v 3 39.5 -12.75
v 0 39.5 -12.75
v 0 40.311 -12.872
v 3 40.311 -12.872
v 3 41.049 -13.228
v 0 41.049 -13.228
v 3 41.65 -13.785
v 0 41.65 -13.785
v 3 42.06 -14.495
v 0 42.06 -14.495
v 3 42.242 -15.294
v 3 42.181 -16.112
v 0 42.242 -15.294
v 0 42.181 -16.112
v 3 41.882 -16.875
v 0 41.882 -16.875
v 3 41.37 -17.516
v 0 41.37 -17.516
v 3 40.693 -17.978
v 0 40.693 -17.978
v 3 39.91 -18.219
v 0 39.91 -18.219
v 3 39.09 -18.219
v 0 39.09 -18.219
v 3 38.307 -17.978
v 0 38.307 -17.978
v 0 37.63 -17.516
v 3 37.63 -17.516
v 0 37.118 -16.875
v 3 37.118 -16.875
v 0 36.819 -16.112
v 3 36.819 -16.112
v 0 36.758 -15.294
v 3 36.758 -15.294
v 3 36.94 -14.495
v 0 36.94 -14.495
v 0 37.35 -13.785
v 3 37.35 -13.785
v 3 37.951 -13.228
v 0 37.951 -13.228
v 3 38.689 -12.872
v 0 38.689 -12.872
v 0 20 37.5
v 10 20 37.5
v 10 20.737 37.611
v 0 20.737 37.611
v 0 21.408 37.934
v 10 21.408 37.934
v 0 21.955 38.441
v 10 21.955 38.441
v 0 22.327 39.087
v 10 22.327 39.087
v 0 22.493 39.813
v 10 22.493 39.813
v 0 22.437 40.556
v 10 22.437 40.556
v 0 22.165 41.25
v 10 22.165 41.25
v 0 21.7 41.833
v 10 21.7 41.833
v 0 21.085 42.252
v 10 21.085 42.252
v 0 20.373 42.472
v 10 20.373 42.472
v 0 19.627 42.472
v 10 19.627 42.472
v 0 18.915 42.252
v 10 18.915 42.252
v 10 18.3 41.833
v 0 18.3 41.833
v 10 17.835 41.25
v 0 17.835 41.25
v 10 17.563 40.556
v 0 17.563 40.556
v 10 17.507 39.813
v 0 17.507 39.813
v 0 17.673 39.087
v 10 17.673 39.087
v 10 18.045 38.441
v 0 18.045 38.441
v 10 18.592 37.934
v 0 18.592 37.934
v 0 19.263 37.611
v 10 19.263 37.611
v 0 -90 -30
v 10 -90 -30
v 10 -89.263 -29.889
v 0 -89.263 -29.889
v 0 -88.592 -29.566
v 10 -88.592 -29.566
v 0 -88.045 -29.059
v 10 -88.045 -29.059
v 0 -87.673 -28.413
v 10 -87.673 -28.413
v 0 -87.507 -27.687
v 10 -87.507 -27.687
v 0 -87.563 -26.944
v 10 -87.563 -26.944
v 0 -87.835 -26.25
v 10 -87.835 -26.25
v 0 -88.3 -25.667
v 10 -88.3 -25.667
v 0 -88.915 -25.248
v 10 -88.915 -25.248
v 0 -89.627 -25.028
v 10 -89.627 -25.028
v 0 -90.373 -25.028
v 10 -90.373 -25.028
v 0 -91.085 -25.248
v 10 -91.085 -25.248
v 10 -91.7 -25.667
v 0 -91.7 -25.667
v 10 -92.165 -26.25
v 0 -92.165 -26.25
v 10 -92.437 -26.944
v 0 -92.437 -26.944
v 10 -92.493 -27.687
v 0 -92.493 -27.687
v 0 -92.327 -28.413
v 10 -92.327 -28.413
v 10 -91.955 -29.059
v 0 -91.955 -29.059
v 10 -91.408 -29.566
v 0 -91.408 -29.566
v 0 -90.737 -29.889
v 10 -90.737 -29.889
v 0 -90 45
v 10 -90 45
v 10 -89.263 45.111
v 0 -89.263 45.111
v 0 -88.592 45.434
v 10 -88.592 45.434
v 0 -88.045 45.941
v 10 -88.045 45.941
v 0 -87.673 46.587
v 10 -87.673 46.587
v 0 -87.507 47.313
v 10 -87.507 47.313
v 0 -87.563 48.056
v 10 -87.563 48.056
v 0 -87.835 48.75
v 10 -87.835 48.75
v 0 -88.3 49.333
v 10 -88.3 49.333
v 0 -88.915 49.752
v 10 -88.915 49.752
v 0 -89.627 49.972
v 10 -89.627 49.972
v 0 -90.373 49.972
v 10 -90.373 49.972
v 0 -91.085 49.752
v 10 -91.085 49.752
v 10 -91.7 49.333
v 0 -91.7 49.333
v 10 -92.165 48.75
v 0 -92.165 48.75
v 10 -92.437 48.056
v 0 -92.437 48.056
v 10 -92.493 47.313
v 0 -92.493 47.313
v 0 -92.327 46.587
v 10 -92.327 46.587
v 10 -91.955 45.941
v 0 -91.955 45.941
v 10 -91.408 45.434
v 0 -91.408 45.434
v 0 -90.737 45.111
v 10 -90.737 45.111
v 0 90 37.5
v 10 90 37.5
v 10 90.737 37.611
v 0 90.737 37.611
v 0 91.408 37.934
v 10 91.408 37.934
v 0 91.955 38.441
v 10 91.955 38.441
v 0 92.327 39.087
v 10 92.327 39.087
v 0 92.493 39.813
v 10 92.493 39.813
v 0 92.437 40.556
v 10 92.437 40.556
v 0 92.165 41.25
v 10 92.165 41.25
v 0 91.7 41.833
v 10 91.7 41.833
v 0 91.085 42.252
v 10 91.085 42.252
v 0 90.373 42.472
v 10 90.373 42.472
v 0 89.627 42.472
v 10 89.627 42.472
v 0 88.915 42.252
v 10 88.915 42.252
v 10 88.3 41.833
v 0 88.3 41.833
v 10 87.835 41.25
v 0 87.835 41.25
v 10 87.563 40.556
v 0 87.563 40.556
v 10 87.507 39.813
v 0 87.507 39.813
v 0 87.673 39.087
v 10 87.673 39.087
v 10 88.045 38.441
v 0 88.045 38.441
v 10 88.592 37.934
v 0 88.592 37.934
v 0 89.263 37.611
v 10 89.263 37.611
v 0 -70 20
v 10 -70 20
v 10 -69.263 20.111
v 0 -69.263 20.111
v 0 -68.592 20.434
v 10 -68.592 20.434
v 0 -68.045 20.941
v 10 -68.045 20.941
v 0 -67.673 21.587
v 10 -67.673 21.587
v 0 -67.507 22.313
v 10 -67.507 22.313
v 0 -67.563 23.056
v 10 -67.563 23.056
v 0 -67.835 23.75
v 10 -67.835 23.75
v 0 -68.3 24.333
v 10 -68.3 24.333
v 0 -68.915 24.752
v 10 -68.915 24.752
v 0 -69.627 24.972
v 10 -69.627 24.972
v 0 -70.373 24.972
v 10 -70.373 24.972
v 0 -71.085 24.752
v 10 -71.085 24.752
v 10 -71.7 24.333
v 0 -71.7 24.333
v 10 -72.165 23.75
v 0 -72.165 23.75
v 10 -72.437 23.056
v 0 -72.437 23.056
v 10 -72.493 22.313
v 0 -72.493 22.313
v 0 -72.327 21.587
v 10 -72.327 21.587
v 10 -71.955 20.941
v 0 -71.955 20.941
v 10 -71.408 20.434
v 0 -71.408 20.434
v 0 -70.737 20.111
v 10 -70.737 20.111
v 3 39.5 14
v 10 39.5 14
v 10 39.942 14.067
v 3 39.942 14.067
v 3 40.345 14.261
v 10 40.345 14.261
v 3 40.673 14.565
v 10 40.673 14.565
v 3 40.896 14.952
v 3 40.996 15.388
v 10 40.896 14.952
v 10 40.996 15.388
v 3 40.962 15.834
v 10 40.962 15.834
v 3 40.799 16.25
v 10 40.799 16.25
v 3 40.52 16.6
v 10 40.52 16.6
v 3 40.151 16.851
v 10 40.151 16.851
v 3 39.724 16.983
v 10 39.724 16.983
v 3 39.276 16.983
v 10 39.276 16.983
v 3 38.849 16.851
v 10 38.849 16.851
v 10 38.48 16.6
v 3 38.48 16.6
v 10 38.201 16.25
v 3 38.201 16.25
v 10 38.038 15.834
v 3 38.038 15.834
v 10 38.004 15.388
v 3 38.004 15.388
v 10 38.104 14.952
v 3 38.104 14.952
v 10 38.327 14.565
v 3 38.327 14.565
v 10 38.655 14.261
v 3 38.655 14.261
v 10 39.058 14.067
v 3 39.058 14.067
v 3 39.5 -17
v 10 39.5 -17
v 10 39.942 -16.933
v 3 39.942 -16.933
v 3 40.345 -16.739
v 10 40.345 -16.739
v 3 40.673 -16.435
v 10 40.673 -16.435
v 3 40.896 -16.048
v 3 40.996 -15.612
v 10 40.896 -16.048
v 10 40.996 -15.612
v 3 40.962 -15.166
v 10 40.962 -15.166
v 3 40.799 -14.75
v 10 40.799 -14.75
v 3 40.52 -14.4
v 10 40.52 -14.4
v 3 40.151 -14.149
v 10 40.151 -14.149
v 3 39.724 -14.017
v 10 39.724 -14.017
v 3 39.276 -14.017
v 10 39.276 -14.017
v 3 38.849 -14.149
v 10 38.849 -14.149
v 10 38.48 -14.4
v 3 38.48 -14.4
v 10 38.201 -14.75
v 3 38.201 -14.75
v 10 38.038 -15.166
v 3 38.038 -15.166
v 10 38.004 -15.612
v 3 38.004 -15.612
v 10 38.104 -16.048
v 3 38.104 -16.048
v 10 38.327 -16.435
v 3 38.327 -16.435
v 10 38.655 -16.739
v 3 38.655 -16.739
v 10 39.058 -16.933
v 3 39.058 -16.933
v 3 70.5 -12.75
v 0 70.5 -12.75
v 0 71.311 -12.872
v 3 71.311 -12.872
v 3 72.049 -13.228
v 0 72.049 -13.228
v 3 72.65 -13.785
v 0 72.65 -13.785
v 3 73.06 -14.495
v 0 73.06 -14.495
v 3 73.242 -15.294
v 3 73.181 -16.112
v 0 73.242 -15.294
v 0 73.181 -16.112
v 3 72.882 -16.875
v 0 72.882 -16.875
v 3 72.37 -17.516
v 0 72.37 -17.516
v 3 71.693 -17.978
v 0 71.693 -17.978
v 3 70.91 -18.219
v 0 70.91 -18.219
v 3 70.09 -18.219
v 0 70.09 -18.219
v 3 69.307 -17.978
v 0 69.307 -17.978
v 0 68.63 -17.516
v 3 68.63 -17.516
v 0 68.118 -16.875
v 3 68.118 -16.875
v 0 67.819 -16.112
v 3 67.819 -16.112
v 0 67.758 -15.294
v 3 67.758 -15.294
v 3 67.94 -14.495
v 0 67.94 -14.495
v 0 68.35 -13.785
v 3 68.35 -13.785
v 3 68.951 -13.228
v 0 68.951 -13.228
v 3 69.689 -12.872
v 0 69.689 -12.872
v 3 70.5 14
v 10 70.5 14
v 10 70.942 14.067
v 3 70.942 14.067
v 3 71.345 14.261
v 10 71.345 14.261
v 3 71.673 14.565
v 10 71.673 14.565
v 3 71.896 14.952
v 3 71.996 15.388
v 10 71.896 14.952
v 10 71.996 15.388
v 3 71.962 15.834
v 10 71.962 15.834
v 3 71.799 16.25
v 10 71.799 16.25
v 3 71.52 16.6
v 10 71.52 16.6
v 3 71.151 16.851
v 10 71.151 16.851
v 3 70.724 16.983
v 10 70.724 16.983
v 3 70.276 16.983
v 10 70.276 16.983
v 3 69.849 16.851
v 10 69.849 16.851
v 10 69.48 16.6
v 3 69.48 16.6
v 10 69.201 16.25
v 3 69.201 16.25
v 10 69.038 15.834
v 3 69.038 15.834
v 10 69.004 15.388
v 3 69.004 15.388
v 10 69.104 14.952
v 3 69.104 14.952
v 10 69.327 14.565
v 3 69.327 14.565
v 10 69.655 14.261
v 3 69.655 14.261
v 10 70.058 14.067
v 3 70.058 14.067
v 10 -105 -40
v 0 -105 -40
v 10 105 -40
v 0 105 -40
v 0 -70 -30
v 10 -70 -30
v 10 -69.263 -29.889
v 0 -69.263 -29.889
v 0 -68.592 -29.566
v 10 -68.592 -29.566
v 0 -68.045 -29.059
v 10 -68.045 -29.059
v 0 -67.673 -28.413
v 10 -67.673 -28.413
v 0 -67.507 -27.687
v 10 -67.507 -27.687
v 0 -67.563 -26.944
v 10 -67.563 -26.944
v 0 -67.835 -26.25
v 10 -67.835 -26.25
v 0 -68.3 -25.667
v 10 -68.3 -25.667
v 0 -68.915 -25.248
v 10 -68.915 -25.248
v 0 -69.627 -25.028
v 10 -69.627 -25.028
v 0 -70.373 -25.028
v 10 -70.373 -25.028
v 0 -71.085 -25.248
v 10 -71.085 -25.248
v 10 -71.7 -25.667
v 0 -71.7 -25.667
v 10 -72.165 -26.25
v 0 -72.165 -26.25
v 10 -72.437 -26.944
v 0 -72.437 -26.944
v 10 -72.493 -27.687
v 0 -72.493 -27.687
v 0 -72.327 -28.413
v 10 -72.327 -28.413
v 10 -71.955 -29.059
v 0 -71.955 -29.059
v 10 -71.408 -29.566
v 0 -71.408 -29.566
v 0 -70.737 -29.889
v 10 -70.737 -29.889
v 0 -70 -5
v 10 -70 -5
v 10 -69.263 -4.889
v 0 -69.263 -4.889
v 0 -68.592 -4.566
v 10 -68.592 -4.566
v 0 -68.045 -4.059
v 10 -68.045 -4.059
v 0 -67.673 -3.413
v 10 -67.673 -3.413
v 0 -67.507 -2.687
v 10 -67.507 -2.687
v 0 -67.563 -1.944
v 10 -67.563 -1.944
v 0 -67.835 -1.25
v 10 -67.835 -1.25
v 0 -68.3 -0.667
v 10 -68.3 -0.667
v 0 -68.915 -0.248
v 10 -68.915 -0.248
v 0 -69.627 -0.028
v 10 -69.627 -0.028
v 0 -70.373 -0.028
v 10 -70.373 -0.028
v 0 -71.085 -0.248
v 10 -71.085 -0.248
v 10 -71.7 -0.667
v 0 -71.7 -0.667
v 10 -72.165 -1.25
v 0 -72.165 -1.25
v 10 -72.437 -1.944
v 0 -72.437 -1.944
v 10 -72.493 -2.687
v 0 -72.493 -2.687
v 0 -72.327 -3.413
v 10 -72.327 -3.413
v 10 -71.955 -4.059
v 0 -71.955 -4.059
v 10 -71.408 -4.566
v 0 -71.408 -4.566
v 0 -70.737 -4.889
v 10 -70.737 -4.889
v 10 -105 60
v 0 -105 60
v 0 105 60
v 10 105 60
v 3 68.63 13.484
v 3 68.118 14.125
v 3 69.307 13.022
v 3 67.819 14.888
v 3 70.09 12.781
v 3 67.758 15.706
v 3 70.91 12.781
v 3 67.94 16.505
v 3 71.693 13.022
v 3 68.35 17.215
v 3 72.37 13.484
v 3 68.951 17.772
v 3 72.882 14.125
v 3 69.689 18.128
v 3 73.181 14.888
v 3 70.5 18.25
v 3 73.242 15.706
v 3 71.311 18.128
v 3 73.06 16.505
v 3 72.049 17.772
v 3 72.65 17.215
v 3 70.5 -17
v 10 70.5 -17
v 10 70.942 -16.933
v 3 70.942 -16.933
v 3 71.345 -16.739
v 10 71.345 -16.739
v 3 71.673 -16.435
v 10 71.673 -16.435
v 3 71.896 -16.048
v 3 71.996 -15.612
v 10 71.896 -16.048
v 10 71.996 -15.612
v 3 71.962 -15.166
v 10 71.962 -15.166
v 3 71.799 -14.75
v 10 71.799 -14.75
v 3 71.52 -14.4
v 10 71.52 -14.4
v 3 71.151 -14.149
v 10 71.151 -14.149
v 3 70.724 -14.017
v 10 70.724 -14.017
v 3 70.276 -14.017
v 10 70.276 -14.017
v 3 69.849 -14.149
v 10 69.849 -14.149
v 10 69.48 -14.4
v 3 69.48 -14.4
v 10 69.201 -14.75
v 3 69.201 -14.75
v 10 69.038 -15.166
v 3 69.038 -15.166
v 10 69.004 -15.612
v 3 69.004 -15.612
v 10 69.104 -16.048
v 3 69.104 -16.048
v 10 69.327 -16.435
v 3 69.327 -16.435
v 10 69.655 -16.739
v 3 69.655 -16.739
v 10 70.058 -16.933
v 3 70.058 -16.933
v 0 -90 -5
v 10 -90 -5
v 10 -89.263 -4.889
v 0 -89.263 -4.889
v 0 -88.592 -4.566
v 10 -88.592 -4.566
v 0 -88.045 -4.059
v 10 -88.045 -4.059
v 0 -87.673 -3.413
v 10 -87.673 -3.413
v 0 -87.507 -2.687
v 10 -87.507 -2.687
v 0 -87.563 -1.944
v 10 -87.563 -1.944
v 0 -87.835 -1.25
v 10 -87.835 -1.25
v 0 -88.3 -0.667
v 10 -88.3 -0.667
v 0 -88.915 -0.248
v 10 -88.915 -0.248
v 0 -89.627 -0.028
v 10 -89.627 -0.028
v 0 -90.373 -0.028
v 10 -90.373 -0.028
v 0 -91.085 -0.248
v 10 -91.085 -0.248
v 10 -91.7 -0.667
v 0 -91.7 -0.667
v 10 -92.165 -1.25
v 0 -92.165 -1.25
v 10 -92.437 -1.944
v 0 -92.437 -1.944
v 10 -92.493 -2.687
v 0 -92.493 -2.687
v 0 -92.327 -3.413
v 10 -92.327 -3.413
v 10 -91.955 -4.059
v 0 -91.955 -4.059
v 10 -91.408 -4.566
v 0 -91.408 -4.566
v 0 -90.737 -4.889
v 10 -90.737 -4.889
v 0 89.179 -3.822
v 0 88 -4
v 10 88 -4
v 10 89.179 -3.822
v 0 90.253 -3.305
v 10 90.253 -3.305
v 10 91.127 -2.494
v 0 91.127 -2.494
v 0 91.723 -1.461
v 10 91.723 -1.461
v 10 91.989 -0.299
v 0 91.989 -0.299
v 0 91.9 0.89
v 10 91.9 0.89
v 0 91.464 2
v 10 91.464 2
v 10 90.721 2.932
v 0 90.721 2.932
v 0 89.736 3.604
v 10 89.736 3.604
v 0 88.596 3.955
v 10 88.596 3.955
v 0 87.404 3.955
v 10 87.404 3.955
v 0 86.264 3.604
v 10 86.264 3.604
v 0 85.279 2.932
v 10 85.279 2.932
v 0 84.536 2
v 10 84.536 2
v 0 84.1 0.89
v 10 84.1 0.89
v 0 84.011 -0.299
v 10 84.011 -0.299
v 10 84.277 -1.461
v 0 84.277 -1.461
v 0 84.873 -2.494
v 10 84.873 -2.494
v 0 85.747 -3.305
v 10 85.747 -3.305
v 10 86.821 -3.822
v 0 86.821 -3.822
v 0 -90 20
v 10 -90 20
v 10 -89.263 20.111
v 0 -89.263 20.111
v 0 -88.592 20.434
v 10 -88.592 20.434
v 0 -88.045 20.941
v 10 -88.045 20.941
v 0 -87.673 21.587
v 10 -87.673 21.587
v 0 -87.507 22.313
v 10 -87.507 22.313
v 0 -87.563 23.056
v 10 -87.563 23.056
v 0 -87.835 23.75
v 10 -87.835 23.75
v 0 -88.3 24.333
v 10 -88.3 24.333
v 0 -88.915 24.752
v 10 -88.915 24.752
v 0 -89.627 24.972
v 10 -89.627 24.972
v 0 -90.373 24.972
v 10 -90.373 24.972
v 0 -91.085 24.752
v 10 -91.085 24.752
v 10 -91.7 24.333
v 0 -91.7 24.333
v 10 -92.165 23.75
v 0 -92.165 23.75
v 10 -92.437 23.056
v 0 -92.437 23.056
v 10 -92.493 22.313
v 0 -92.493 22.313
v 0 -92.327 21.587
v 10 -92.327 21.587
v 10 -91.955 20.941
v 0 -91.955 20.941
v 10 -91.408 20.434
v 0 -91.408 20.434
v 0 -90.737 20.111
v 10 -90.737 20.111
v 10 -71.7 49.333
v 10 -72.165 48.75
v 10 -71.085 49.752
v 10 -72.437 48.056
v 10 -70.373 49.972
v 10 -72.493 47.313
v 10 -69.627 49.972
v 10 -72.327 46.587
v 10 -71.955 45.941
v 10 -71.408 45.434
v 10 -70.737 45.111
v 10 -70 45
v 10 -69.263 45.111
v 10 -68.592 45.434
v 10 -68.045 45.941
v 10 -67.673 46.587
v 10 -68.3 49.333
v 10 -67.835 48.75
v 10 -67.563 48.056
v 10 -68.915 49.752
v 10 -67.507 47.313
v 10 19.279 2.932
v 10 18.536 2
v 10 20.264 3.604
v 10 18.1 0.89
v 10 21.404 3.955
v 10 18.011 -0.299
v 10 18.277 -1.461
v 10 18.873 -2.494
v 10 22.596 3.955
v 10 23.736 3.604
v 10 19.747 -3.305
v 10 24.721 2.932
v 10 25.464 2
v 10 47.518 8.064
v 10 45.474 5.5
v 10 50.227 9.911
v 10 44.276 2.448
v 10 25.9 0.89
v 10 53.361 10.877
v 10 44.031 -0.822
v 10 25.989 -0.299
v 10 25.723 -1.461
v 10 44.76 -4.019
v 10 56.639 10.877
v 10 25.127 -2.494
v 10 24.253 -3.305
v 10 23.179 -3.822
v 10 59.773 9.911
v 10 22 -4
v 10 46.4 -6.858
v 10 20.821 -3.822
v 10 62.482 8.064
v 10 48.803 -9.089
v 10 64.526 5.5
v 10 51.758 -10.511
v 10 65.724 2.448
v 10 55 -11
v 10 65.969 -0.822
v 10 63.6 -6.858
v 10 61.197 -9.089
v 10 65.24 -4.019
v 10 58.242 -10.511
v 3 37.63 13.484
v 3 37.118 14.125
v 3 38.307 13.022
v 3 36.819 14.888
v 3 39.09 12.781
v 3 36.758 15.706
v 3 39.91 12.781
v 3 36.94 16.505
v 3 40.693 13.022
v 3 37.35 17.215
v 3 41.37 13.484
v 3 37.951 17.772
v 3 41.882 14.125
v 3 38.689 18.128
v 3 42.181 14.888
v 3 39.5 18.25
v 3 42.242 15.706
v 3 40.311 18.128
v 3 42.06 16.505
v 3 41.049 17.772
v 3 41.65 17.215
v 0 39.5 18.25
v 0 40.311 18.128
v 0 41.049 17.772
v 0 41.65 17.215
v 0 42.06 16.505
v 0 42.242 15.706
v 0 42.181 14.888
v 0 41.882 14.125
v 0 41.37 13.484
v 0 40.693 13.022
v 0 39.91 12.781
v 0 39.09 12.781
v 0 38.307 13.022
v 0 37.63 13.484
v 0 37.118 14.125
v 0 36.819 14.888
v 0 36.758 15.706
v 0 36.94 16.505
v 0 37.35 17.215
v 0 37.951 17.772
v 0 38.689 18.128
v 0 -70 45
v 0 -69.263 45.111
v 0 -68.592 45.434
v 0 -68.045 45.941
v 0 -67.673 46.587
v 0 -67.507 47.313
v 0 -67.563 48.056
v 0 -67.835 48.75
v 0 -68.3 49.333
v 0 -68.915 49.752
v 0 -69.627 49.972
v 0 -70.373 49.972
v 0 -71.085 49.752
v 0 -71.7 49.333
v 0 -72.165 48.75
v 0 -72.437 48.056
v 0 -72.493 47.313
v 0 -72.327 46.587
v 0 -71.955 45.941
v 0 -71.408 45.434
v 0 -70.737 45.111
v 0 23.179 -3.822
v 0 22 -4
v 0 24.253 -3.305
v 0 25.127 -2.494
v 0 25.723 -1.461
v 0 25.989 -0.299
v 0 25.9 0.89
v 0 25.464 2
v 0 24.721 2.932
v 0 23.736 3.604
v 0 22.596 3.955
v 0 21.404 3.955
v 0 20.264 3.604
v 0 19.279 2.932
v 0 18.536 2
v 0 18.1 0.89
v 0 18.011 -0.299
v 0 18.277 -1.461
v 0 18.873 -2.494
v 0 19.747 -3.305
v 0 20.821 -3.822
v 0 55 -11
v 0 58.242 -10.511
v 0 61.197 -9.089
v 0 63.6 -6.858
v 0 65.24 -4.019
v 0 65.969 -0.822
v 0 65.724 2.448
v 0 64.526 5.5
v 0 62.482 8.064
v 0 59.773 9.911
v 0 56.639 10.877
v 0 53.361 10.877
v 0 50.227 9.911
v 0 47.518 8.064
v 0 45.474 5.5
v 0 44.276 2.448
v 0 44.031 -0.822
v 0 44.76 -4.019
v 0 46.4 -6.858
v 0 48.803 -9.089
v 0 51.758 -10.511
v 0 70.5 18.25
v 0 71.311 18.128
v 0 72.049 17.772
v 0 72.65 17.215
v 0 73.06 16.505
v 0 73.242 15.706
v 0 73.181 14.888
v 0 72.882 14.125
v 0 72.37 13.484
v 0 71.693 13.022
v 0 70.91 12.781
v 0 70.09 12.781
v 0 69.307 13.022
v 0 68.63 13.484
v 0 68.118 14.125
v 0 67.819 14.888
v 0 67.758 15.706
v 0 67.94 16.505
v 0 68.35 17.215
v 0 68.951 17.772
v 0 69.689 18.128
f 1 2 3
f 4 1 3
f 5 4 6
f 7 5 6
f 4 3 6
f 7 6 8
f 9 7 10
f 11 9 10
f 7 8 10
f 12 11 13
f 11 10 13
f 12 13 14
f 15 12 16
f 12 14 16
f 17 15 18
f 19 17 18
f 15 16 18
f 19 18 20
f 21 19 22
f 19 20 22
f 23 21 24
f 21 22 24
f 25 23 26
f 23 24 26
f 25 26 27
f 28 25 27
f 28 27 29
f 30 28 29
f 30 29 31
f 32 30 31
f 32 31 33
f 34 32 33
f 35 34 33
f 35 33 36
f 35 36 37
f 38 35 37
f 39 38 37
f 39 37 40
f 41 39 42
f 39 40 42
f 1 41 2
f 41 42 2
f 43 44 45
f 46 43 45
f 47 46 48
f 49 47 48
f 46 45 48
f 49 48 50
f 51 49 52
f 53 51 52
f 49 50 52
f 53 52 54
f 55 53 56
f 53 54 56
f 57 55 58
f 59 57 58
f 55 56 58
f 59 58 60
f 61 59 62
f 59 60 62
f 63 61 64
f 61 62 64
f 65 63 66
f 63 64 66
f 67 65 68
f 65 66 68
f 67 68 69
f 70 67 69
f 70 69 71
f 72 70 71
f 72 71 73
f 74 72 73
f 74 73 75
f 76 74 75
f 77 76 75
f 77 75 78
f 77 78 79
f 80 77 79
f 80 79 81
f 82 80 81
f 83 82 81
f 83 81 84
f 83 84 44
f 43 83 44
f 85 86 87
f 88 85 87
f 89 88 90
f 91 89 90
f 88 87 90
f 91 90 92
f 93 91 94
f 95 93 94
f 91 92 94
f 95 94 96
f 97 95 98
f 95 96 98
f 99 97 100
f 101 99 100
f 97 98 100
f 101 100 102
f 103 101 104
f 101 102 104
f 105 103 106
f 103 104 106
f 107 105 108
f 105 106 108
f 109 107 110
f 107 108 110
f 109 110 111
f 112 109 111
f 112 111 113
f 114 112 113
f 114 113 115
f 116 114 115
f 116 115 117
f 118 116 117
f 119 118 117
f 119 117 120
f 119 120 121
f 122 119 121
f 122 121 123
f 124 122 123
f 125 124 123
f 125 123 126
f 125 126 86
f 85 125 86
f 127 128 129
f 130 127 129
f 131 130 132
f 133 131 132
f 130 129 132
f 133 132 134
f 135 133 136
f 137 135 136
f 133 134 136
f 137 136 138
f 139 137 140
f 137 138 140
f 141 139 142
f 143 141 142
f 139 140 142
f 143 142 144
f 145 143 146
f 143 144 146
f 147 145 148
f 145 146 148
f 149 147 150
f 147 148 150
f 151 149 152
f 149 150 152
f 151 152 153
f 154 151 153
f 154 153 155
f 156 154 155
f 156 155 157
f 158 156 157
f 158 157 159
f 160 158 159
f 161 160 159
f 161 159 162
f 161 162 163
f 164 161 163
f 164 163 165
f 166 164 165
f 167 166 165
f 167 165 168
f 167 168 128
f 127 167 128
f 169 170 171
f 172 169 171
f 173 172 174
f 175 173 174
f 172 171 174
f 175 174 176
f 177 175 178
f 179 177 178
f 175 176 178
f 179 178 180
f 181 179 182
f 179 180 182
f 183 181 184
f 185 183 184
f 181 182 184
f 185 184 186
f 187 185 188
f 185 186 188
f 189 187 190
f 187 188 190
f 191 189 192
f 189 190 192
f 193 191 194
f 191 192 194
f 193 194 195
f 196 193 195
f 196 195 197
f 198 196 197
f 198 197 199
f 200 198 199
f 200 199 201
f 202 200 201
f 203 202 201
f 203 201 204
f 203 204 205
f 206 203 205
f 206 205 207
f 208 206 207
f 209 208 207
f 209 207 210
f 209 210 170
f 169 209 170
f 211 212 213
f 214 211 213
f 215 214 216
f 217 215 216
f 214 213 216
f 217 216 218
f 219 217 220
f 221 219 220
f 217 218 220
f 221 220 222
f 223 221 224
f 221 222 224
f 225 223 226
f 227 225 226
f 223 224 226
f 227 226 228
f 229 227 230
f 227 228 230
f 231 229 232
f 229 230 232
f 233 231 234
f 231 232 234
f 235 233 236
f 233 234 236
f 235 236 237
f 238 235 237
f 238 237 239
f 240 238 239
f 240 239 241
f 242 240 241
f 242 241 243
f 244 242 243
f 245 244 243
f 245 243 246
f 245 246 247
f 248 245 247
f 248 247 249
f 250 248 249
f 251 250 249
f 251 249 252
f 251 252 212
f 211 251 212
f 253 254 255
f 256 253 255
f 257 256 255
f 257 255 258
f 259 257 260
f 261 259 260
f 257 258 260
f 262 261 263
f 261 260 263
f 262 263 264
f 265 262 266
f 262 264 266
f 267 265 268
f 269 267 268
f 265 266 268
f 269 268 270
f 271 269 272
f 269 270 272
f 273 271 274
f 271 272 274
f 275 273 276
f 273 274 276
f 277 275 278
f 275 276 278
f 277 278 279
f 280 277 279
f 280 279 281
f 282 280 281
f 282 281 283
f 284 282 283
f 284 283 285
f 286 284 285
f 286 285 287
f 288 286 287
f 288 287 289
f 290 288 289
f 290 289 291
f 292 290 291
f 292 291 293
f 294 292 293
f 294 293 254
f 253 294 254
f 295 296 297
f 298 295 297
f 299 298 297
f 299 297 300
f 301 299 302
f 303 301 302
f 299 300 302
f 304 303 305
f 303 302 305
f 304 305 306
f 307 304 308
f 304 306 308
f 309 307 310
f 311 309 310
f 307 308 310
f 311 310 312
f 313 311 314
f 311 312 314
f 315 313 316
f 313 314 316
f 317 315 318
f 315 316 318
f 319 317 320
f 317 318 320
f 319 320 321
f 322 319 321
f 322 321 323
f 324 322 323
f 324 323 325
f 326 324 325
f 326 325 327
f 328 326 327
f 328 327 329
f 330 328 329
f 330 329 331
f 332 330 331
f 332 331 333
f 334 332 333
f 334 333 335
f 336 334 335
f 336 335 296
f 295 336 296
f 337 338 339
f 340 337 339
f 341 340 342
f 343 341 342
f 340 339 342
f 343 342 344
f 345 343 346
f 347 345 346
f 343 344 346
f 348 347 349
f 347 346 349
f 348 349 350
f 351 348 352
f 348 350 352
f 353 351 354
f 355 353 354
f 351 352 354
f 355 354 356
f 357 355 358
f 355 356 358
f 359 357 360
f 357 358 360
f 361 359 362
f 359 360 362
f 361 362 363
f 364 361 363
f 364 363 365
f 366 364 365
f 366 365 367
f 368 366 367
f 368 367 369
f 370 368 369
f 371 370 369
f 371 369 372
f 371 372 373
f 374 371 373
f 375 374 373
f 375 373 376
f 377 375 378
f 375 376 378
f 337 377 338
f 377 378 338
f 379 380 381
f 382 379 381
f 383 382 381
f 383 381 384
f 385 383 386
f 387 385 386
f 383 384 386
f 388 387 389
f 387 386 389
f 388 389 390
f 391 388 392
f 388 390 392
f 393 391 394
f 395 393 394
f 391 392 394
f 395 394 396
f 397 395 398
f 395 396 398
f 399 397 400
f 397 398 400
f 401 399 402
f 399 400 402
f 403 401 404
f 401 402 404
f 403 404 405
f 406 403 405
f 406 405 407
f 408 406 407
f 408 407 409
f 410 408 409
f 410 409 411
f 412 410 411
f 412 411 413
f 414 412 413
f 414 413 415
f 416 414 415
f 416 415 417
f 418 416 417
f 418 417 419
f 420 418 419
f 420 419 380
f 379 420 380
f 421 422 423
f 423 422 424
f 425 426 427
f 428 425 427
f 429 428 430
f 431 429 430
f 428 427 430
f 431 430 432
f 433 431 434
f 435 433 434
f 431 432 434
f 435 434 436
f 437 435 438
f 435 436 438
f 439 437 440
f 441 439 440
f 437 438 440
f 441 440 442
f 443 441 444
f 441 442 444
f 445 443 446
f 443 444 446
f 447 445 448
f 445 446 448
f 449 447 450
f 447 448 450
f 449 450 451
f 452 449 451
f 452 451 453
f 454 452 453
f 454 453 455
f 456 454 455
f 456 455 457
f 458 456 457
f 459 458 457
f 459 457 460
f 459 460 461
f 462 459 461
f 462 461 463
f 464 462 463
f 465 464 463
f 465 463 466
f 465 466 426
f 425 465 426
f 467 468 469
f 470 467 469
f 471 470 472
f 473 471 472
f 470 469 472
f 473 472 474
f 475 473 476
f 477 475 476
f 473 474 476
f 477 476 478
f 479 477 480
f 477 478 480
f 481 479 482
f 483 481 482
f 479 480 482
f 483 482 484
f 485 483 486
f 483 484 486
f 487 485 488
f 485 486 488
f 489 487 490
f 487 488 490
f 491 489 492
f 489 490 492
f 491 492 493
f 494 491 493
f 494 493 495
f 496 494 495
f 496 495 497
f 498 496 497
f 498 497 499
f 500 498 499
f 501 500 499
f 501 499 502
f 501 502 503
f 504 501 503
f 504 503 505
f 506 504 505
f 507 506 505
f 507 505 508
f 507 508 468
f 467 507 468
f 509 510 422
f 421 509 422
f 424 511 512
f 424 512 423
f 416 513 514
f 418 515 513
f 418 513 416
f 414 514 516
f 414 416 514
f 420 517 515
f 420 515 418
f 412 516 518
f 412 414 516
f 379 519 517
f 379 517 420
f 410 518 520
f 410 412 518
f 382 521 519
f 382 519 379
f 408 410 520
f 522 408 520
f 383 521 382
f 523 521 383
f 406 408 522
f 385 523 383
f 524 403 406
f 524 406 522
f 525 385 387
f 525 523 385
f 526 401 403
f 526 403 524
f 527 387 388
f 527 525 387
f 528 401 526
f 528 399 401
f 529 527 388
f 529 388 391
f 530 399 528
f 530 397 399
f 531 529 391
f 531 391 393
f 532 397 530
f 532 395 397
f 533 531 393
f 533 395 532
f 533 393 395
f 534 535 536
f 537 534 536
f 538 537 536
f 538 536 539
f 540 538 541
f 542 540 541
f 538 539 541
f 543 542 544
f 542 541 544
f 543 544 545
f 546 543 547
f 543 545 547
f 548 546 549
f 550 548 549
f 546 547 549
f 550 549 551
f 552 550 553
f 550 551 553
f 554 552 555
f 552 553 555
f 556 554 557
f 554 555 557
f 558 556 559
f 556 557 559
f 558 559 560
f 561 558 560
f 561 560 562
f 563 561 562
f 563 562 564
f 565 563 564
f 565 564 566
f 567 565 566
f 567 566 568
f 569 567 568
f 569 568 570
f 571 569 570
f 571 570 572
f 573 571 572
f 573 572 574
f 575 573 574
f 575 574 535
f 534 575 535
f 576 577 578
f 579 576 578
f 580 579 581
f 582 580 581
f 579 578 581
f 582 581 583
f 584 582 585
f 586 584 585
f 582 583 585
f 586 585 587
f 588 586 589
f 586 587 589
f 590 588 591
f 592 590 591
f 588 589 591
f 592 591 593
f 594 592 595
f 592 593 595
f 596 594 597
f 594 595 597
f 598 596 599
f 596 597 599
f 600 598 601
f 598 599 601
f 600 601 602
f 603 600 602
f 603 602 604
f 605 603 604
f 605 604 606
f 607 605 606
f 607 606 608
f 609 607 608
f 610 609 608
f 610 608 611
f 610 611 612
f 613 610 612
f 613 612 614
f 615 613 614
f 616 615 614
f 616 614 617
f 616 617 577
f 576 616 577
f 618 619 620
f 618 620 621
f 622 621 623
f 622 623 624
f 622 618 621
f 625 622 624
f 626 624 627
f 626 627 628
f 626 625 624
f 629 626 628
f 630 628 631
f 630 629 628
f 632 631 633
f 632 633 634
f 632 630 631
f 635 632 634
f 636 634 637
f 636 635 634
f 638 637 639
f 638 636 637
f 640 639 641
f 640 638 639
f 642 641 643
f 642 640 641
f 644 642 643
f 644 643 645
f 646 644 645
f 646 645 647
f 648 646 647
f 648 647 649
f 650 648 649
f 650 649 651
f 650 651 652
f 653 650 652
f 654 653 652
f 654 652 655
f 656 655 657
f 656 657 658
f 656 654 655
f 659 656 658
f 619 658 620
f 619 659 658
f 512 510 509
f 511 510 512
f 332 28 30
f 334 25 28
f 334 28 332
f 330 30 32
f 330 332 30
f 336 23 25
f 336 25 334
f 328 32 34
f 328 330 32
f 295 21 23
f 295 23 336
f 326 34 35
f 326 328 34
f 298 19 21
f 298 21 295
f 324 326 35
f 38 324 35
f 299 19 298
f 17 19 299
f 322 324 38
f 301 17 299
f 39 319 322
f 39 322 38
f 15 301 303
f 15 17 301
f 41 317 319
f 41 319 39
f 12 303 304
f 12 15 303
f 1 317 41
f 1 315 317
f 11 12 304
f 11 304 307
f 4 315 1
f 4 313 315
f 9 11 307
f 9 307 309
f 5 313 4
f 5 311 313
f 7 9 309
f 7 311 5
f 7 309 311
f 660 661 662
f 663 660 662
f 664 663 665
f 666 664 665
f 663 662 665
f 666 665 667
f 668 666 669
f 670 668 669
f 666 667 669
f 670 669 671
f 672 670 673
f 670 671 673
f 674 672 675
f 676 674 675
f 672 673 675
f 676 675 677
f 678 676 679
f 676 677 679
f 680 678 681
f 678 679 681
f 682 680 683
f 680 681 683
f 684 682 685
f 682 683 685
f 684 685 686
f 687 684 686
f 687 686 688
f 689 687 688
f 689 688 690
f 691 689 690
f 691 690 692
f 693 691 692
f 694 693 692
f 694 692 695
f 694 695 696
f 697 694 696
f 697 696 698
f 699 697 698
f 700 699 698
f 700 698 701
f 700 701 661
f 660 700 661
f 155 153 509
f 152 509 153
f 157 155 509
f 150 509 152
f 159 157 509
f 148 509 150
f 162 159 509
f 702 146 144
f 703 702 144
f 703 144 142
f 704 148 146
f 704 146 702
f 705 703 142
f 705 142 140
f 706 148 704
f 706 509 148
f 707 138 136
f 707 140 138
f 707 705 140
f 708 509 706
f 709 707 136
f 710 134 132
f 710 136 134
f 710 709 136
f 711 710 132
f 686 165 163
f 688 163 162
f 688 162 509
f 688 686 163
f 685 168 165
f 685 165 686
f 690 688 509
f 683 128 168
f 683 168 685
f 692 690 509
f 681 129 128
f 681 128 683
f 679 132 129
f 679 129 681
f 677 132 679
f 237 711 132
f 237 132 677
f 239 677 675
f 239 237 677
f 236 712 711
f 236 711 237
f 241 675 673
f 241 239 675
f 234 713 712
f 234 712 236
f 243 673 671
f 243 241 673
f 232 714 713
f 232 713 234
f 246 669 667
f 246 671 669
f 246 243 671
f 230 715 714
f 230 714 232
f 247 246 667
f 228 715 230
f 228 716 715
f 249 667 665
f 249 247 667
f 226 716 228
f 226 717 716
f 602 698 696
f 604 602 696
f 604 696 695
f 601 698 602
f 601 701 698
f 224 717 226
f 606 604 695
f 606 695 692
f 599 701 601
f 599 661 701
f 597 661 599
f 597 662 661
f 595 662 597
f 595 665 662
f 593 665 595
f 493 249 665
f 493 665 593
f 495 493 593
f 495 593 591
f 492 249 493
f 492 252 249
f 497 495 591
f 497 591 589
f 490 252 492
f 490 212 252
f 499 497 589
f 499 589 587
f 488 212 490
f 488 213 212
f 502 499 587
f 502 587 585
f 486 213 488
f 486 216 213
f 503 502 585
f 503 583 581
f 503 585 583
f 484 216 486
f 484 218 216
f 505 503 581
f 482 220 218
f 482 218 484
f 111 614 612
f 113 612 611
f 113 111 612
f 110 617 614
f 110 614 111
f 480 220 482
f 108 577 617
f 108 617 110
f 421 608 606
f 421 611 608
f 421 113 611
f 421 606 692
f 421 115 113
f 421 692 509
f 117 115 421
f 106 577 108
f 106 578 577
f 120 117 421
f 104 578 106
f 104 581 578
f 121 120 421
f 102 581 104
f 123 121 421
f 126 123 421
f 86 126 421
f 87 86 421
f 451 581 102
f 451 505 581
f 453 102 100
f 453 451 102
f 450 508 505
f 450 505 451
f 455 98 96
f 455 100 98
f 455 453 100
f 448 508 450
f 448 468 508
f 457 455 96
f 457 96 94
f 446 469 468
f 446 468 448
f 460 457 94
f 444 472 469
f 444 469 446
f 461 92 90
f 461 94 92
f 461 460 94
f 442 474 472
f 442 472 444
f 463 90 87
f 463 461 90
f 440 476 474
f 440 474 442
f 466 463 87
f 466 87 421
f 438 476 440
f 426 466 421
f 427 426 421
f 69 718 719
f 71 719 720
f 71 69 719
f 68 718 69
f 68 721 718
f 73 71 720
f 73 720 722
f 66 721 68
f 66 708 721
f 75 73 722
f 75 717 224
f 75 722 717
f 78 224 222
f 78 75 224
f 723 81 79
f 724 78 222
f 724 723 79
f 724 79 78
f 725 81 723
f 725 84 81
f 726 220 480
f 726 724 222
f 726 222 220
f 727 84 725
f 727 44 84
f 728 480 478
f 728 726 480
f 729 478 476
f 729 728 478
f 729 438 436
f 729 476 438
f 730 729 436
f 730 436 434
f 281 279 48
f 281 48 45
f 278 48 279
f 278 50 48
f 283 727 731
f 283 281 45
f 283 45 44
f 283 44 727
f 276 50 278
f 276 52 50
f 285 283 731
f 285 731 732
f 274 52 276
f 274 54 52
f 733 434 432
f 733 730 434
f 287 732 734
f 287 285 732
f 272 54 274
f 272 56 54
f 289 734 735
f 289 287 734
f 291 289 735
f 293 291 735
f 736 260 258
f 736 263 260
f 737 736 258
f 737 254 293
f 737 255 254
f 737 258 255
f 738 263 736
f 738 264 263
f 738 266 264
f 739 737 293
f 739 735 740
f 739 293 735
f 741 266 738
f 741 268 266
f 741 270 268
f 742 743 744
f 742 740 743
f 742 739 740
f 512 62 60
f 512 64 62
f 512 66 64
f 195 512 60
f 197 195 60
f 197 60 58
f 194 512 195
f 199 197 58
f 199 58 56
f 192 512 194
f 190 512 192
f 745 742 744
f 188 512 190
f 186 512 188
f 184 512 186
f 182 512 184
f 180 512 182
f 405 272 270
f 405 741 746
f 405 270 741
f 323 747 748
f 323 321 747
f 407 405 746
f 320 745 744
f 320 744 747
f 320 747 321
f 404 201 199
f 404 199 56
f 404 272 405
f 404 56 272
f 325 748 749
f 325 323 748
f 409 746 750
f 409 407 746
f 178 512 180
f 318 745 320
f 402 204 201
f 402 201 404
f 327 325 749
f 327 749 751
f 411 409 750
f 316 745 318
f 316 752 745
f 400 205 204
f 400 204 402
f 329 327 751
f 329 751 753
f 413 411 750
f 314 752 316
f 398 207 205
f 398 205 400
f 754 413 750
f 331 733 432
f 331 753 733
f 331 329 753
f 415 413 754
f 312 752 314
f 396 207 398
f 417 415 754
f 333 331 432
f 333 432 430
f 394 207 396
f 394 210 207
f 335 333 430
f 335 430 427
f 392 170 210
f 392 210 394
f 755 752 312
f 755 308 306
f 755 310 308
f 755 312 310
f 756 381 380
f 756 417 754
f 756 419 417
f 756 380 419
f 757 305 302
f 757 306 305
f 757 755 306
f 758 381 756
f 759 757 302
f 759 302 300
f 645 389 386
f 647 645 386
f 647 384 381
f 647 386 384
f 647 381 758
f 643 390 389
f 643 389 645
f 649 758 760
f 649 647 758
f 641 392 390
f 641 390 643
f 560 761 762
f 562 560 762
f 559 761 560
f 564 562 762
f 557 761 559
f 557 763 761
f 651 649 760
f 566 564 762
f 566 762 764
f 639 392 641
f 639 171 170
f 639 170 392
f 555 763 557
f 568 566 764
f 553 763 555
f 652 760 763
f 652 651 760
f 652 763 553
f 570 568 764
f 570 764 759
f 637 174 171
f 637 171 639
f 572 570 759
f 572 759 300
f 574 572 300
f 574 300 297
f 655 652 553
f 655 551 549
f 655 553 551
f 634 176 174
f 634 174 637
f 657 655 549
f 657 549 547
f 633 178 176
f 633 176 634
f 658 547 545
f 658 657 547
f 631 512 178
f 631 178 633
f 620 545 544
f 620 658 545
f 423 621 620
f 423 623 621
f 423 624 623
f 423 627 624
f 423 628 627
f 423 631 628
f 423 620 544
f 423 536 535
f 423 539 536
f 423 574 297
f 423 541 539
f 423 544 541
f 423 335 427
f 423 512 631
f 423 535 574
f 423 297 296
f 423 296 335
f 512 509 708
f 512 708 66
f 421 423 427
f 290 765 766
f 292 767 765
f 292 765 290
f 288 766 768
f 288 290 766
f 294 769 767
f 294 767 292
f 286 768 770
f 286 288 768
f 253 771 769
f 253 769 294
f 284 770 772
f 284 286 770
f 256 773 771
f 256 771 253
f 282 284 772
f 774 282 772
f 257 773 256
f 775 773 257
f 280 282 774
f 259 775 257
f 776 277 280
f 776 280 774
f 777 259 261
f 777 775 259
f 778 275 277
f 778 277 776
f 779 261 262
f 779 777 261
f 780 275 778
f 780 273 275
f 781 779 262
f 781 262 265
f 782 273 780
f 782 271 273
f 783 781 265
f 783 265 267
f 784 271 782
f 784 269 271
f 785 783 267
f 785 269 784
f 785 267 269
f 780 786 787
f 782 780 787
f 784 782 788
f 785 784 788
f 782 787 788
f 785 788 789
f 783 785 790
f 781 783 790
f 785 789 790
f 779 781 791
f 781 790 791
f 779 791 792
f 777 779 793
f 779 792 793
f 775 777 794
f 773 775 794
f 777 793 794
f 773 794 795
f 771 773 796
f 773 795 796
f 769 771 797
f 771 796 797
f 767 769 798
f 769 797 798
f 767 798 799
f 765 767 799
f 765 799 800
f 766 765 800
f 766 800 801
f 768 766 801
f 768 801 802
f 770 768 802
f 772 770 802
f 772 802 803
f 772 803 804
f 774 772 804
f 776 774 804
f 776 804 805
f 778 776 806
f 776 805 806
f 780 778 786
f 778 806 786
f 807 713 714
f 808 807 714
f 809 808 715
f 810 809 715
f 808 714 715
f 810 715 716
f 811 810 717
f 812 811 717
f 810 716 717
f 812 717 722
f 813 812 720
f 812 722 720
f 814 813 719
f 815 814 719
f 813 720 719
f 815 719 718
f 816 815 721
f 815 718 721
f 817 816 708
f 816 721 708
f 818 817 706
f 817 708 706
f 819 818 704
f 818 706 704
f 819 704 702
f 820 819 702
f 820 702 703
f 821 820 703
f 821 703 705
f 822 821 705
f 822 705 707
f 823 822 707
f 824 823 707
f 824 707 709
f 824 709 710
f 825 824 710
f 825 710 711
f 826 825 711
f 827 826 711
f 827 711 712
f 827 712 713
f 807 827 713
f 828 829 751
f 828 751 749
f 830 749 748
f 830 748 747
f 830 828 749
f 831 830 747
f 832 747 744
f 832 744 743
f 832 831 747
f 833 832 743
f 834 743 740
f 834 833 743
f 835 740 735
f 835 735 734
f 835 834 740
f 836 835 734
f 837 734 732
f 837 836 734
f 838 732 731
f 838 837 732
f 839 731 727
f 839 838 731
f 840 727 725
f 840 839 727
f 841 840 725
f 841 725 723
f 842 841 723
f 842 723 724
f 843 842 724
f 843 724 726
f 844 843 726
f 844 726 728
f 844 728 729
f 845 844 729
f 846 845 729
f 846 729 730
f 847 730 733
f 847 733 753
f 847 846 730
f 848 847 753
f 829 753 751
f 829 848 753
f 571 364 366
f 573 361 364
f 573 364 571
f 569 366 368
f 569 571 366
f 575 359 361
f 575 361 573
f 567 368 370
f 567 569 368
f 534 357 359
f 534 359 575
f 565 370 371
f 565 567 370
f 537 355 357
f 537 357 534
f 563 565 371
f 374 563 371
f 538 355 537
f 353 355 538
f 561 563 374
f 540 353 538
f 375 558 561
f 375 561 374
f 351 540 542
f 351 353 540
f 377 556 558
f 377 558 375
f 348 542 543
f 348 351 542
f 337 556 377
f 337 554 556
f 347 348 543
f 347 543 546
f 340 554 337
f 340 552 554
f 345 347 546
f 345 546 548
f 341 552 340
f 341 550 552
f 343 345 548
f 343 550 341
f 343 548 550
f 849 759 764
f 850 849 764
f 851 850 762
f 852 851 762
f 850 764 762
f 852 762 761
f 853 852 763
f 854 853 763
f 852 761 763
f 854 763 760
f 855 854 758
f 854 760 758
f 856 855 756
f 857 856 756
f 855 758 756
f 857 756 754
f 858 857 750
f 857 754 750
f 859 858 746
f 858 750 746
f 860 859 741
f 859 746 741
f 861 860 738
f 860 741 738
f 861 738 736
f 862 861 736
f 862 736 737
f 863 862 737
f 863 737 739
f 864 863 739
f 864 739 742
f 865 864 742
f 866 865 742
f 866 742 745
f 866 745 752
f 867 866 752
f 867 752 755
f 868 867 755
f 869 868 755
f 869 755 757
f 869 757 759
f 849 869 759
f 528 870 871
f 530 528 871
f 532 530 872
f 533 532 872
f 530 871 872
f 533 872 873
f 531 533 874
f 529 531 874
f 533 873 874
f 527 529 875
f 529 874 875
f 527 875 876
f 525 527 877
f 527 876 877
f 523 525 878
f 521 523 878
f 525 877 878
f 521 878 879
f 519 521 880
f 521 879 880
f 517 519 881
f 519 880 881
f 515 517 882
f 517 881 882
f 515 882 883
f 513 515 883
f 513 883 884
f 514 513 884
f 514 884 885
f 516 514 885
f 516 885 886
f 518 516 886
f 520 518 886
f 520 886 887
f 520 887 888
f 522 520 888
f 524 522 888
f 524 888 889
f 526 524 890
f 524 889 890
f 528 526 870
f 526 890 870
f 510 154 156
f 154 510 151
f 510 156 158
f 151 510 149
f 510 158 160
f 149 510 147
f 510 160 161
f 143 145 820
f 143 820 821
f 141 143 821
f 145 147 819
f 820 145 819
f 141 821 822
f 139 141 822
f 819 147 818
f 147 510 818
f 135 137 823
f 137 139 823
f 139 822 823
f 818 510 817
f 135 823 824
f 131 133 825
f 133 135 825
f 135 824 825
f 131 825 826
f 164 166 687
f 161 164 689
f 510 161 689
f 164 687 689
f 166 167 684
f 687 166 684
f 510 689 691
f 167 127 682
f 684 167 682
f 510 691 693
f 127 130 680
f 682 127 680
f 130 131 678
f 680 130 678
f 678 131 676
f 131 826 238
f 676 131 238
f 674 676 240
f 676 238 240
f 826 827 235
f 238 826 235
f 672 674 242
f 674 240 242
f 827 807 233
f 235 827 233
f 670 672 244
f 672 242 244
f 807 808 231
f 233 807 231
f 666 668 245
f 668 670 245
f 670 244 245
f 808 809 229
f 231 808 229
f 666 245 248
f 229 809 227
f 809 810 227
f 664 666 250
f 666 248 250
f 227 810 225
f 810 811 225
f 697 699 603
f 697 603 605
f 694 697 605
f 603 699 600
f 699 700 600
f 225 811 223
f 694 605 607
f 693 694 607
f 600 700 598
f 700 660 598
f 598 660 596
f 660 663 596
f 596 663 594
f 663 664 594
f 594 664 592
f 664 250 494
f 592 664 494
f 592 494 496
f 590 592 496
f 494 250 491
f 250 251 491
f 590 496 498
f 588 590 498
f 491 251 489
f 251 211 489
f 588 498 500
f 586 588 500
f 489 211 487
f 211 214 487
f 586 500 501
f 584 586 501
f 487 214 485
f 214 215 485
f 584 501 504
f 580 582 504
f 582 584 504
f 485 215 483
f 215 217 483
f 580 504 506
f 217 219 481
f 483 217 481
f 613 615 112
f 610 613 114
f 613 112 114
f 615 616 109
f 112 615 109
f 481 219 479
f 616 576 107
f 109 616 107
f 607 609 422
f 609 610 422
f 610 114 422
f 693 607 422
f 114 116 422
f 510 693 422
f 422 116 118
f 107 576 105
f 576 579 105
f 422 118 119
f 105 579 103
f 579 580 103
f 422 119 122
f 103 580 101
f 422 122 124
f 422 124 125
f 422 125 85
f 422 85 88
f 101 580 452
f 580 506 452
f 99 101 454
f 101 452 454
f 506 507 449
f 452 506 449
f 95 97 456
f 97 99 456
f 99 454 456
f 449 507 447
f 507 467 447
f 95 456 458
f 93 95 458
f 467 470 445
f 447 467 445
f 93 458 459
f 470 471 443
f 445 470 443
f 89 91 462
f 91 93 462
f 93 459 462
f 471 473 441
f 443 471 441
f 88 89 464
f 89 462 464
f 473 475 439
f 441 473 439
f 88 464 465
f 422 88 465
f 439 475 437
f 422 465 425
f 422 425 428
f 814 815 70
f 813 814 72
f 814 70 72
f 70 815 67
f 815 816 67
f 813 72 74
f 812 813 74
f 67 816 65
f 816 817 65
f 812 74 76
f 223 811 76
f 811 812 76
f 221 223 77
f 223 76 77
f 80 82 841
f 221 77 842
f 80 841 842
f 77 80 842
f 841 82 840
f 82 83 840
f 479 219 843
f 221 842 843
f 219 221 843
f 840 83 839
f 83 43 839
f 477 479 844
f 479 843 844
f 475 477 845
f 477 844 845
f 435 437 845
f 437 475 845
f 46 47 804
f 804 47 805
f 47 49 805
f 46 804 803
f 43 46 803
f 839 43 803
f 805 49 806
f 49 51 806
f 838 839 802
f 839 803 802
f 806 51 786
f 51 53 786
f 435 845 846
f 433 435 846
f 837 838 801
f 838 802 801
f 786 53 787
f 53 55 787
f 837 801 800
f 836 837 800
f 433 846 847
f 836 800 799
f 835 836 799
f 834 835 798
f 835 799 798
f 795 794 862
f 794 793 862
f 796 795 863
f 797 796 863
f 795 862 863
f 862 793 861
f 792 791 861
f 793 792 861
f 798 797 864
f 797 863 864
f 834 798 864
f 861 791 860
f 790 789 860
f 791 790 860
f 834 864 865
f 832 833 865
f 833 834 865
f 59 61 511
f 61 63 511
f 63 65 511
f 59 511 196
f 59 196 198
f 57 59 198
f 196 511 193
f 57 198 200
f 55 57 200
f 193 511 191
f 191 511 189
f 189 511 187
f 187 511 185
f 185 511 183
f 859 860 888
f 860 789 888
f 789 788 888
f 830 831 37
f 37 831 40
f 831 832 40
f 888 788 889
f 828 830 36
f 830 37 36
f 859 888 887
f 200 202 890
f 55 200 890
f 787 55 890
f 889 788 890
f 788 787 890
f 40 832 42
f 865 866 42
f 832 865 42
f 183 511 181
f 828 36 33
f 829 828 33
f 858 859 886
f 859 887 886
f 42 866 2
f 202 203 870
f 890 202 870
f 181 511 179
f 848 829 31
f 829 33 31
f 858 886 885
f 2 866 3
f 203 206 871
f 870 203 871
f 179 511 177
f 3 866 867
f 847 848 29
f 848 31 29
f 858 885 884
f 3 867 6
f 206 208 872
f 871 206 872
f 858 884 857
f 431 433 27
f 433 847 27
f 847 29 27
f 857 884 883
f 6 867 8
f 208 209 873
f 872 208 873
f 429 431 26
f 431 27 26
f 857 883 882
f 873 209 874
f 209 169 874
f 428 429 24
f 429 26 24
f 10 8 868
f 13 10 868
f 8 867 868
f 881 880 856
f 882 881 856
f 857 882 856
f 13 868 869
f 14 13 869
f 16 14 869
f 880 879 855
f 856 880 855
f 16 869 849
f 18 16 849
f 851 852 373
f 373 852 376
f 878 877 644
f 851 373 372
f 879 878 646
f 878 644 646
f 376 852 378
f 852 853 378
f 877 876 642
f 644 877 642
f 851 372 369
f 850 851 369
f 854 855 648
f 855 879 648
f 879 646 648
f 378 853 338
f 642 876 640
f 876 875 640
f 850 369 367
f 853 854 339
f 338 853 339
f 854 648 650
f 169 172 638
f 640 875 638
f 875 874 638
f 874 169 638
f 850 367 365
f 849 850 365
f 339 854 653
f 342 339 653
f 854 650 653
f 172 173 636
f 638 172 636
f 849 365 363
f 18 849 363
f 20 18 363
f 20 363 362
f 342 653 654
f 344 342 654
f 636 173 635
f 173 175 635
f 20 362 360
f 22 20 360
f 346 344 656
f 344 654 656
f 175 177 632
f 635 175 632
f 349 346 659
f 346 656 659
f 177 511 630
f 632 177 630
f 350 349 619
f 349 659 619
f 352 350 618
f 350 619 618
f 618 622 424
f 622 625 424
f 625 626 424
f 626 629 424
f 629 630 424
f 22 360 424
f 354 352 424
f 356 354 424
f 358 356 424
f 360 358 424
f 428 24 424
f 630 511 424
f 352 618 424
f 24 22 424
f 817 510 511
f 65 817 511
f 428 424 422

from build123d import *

# Parameters (mm, degrees)
SKETCH2_W                       = 100
SKETCH2_H                       = 210
SKETCH2_R                       = 4
BOSS_EXTRUDE1_DEPTH             = 10
SKETCH3_R                       = 2.5
MOUNT_DEPTH                     = 11
SKETCH7_R                       = 2.5
SUPPORT_PROFILE_MOUNT_DEPTH     = 11
SKETCH4_R                       = 11
SKETCH4_R_2                     = 1.5
STEPPER_MOUNT_DEPTH             = 11
SKETCH6_R                       = 2.75
STEPPER_MOUNT_COUNTERSINK_DEPTH = 3


with BuildPart() as part:
    # Sketch2 → Boss-Extrude1 (new body)
    with BuildSketch(Plane(origin=(0, 0, 0), x_dir=(0, 0, -1), z_dir=(1, 0, 0))):
        with Locations((-10, 0)):
            Rectangle(SKETCH2_W, SKETCH2_H)
        with Locations((0, 88)):
            Circle(SKETCH2_R, mode=Mode.SUBTRACT)
        with Locations((0, 22)):
            Circle(SKETCH2_R, mode=Mode.SUBTRACT)
    extrude(amount=BOSS_EXTRUDE1_DEPTH)

    # Sketch3 → mount (cut, through all)
    with BuildSketch(Plane(origin=(10, 0, 0), x_dir=(0, 0, -1), z_dir=(1, 0, 0))):
        with Locations((-22.5, -70)):
            Circle(SKETCH3_R)
        with Locations((-47.5, -70)):
            Circle(SKETCH3_R)
        with Locations((-47.5, -90)):
            Circle(SKETCH3_R)
        with Locations((-22.5, -90)):
            Circle(SKETCH3_R)
        with Locations((2.5, -90)):
            Circle(SKETCH3_R)
        with Locations((27.5, -90)):
            Circle(SKETCH3_R)
        with Locations((27.5, -70)):
            Circle(SKETCH3_R)
        with Locations((2.5, -70)):
            Circle(SKETCH3_R)
    extrude(amount=-MOUNT_DEPTH, mode=Mode.SUBTRACT)

    # Sketch7 → support_profile_mount (cut, through all)
    with BuildSketch(Plane(origin=(10, 0, 0), x_dir=(0, 0, -1), z_dir=(1, 0, 0))):
        with Locations((-40, 90)):
            Circle(SKETCH7_R)
        with Locations((-40, 20)):
            Circle(SKETCH7_R)
    extrude(amount=-SUPPORT_PROFILE_MOUNT_DEPTH, mode=Mode.SUBTRACT)

    # Sketch4 → stepper_mount (cut, through all)
    with BuildSketch(Plane(origin=(10, 0, 0), x_dir=(0, 0, -1), z_dir=(1, 0, 0))):
        with Locations((0, 55)):
            Circle(SKETCH4_R)
        with Locations((-15.5, 70.5)):
            Circle(SKETCH4_R_2)
        with Locations((15.5, 70.5)):
            Circle(SKETCH4_R_2)
        with Locations((-15.5, 39.5)):
            Circle(SKETCH4_R_2)
        with Locations((15.5, 39.5)):
            Circle(SKETCH4_R_2)
    extrude(amount=-STEPPER_MOUNT_DEPTH, mode=Mode.SUBTRACT)

    # Sketch6 → stepper_mount_countersink (cut)
    with BuildSketch(Plane.ZY):
        with Locations((-15.5, 70.5)):
            Circle(SKETCH6_R)
        with Locations((15.5, 70.5)):
            Circle(SKETCH6_R)
        with Locations((15.5, 39.5)):
            Circle(SKETCH6_R)
        with Locations((-15.5, 39.5)):
            Circle(SKETCH6_R)
    extrude(amount=-STEPPER_MOUNT_COUNTERSINK_DEPTH, mode=Mode.SUBTRACT)


solid = part.part
